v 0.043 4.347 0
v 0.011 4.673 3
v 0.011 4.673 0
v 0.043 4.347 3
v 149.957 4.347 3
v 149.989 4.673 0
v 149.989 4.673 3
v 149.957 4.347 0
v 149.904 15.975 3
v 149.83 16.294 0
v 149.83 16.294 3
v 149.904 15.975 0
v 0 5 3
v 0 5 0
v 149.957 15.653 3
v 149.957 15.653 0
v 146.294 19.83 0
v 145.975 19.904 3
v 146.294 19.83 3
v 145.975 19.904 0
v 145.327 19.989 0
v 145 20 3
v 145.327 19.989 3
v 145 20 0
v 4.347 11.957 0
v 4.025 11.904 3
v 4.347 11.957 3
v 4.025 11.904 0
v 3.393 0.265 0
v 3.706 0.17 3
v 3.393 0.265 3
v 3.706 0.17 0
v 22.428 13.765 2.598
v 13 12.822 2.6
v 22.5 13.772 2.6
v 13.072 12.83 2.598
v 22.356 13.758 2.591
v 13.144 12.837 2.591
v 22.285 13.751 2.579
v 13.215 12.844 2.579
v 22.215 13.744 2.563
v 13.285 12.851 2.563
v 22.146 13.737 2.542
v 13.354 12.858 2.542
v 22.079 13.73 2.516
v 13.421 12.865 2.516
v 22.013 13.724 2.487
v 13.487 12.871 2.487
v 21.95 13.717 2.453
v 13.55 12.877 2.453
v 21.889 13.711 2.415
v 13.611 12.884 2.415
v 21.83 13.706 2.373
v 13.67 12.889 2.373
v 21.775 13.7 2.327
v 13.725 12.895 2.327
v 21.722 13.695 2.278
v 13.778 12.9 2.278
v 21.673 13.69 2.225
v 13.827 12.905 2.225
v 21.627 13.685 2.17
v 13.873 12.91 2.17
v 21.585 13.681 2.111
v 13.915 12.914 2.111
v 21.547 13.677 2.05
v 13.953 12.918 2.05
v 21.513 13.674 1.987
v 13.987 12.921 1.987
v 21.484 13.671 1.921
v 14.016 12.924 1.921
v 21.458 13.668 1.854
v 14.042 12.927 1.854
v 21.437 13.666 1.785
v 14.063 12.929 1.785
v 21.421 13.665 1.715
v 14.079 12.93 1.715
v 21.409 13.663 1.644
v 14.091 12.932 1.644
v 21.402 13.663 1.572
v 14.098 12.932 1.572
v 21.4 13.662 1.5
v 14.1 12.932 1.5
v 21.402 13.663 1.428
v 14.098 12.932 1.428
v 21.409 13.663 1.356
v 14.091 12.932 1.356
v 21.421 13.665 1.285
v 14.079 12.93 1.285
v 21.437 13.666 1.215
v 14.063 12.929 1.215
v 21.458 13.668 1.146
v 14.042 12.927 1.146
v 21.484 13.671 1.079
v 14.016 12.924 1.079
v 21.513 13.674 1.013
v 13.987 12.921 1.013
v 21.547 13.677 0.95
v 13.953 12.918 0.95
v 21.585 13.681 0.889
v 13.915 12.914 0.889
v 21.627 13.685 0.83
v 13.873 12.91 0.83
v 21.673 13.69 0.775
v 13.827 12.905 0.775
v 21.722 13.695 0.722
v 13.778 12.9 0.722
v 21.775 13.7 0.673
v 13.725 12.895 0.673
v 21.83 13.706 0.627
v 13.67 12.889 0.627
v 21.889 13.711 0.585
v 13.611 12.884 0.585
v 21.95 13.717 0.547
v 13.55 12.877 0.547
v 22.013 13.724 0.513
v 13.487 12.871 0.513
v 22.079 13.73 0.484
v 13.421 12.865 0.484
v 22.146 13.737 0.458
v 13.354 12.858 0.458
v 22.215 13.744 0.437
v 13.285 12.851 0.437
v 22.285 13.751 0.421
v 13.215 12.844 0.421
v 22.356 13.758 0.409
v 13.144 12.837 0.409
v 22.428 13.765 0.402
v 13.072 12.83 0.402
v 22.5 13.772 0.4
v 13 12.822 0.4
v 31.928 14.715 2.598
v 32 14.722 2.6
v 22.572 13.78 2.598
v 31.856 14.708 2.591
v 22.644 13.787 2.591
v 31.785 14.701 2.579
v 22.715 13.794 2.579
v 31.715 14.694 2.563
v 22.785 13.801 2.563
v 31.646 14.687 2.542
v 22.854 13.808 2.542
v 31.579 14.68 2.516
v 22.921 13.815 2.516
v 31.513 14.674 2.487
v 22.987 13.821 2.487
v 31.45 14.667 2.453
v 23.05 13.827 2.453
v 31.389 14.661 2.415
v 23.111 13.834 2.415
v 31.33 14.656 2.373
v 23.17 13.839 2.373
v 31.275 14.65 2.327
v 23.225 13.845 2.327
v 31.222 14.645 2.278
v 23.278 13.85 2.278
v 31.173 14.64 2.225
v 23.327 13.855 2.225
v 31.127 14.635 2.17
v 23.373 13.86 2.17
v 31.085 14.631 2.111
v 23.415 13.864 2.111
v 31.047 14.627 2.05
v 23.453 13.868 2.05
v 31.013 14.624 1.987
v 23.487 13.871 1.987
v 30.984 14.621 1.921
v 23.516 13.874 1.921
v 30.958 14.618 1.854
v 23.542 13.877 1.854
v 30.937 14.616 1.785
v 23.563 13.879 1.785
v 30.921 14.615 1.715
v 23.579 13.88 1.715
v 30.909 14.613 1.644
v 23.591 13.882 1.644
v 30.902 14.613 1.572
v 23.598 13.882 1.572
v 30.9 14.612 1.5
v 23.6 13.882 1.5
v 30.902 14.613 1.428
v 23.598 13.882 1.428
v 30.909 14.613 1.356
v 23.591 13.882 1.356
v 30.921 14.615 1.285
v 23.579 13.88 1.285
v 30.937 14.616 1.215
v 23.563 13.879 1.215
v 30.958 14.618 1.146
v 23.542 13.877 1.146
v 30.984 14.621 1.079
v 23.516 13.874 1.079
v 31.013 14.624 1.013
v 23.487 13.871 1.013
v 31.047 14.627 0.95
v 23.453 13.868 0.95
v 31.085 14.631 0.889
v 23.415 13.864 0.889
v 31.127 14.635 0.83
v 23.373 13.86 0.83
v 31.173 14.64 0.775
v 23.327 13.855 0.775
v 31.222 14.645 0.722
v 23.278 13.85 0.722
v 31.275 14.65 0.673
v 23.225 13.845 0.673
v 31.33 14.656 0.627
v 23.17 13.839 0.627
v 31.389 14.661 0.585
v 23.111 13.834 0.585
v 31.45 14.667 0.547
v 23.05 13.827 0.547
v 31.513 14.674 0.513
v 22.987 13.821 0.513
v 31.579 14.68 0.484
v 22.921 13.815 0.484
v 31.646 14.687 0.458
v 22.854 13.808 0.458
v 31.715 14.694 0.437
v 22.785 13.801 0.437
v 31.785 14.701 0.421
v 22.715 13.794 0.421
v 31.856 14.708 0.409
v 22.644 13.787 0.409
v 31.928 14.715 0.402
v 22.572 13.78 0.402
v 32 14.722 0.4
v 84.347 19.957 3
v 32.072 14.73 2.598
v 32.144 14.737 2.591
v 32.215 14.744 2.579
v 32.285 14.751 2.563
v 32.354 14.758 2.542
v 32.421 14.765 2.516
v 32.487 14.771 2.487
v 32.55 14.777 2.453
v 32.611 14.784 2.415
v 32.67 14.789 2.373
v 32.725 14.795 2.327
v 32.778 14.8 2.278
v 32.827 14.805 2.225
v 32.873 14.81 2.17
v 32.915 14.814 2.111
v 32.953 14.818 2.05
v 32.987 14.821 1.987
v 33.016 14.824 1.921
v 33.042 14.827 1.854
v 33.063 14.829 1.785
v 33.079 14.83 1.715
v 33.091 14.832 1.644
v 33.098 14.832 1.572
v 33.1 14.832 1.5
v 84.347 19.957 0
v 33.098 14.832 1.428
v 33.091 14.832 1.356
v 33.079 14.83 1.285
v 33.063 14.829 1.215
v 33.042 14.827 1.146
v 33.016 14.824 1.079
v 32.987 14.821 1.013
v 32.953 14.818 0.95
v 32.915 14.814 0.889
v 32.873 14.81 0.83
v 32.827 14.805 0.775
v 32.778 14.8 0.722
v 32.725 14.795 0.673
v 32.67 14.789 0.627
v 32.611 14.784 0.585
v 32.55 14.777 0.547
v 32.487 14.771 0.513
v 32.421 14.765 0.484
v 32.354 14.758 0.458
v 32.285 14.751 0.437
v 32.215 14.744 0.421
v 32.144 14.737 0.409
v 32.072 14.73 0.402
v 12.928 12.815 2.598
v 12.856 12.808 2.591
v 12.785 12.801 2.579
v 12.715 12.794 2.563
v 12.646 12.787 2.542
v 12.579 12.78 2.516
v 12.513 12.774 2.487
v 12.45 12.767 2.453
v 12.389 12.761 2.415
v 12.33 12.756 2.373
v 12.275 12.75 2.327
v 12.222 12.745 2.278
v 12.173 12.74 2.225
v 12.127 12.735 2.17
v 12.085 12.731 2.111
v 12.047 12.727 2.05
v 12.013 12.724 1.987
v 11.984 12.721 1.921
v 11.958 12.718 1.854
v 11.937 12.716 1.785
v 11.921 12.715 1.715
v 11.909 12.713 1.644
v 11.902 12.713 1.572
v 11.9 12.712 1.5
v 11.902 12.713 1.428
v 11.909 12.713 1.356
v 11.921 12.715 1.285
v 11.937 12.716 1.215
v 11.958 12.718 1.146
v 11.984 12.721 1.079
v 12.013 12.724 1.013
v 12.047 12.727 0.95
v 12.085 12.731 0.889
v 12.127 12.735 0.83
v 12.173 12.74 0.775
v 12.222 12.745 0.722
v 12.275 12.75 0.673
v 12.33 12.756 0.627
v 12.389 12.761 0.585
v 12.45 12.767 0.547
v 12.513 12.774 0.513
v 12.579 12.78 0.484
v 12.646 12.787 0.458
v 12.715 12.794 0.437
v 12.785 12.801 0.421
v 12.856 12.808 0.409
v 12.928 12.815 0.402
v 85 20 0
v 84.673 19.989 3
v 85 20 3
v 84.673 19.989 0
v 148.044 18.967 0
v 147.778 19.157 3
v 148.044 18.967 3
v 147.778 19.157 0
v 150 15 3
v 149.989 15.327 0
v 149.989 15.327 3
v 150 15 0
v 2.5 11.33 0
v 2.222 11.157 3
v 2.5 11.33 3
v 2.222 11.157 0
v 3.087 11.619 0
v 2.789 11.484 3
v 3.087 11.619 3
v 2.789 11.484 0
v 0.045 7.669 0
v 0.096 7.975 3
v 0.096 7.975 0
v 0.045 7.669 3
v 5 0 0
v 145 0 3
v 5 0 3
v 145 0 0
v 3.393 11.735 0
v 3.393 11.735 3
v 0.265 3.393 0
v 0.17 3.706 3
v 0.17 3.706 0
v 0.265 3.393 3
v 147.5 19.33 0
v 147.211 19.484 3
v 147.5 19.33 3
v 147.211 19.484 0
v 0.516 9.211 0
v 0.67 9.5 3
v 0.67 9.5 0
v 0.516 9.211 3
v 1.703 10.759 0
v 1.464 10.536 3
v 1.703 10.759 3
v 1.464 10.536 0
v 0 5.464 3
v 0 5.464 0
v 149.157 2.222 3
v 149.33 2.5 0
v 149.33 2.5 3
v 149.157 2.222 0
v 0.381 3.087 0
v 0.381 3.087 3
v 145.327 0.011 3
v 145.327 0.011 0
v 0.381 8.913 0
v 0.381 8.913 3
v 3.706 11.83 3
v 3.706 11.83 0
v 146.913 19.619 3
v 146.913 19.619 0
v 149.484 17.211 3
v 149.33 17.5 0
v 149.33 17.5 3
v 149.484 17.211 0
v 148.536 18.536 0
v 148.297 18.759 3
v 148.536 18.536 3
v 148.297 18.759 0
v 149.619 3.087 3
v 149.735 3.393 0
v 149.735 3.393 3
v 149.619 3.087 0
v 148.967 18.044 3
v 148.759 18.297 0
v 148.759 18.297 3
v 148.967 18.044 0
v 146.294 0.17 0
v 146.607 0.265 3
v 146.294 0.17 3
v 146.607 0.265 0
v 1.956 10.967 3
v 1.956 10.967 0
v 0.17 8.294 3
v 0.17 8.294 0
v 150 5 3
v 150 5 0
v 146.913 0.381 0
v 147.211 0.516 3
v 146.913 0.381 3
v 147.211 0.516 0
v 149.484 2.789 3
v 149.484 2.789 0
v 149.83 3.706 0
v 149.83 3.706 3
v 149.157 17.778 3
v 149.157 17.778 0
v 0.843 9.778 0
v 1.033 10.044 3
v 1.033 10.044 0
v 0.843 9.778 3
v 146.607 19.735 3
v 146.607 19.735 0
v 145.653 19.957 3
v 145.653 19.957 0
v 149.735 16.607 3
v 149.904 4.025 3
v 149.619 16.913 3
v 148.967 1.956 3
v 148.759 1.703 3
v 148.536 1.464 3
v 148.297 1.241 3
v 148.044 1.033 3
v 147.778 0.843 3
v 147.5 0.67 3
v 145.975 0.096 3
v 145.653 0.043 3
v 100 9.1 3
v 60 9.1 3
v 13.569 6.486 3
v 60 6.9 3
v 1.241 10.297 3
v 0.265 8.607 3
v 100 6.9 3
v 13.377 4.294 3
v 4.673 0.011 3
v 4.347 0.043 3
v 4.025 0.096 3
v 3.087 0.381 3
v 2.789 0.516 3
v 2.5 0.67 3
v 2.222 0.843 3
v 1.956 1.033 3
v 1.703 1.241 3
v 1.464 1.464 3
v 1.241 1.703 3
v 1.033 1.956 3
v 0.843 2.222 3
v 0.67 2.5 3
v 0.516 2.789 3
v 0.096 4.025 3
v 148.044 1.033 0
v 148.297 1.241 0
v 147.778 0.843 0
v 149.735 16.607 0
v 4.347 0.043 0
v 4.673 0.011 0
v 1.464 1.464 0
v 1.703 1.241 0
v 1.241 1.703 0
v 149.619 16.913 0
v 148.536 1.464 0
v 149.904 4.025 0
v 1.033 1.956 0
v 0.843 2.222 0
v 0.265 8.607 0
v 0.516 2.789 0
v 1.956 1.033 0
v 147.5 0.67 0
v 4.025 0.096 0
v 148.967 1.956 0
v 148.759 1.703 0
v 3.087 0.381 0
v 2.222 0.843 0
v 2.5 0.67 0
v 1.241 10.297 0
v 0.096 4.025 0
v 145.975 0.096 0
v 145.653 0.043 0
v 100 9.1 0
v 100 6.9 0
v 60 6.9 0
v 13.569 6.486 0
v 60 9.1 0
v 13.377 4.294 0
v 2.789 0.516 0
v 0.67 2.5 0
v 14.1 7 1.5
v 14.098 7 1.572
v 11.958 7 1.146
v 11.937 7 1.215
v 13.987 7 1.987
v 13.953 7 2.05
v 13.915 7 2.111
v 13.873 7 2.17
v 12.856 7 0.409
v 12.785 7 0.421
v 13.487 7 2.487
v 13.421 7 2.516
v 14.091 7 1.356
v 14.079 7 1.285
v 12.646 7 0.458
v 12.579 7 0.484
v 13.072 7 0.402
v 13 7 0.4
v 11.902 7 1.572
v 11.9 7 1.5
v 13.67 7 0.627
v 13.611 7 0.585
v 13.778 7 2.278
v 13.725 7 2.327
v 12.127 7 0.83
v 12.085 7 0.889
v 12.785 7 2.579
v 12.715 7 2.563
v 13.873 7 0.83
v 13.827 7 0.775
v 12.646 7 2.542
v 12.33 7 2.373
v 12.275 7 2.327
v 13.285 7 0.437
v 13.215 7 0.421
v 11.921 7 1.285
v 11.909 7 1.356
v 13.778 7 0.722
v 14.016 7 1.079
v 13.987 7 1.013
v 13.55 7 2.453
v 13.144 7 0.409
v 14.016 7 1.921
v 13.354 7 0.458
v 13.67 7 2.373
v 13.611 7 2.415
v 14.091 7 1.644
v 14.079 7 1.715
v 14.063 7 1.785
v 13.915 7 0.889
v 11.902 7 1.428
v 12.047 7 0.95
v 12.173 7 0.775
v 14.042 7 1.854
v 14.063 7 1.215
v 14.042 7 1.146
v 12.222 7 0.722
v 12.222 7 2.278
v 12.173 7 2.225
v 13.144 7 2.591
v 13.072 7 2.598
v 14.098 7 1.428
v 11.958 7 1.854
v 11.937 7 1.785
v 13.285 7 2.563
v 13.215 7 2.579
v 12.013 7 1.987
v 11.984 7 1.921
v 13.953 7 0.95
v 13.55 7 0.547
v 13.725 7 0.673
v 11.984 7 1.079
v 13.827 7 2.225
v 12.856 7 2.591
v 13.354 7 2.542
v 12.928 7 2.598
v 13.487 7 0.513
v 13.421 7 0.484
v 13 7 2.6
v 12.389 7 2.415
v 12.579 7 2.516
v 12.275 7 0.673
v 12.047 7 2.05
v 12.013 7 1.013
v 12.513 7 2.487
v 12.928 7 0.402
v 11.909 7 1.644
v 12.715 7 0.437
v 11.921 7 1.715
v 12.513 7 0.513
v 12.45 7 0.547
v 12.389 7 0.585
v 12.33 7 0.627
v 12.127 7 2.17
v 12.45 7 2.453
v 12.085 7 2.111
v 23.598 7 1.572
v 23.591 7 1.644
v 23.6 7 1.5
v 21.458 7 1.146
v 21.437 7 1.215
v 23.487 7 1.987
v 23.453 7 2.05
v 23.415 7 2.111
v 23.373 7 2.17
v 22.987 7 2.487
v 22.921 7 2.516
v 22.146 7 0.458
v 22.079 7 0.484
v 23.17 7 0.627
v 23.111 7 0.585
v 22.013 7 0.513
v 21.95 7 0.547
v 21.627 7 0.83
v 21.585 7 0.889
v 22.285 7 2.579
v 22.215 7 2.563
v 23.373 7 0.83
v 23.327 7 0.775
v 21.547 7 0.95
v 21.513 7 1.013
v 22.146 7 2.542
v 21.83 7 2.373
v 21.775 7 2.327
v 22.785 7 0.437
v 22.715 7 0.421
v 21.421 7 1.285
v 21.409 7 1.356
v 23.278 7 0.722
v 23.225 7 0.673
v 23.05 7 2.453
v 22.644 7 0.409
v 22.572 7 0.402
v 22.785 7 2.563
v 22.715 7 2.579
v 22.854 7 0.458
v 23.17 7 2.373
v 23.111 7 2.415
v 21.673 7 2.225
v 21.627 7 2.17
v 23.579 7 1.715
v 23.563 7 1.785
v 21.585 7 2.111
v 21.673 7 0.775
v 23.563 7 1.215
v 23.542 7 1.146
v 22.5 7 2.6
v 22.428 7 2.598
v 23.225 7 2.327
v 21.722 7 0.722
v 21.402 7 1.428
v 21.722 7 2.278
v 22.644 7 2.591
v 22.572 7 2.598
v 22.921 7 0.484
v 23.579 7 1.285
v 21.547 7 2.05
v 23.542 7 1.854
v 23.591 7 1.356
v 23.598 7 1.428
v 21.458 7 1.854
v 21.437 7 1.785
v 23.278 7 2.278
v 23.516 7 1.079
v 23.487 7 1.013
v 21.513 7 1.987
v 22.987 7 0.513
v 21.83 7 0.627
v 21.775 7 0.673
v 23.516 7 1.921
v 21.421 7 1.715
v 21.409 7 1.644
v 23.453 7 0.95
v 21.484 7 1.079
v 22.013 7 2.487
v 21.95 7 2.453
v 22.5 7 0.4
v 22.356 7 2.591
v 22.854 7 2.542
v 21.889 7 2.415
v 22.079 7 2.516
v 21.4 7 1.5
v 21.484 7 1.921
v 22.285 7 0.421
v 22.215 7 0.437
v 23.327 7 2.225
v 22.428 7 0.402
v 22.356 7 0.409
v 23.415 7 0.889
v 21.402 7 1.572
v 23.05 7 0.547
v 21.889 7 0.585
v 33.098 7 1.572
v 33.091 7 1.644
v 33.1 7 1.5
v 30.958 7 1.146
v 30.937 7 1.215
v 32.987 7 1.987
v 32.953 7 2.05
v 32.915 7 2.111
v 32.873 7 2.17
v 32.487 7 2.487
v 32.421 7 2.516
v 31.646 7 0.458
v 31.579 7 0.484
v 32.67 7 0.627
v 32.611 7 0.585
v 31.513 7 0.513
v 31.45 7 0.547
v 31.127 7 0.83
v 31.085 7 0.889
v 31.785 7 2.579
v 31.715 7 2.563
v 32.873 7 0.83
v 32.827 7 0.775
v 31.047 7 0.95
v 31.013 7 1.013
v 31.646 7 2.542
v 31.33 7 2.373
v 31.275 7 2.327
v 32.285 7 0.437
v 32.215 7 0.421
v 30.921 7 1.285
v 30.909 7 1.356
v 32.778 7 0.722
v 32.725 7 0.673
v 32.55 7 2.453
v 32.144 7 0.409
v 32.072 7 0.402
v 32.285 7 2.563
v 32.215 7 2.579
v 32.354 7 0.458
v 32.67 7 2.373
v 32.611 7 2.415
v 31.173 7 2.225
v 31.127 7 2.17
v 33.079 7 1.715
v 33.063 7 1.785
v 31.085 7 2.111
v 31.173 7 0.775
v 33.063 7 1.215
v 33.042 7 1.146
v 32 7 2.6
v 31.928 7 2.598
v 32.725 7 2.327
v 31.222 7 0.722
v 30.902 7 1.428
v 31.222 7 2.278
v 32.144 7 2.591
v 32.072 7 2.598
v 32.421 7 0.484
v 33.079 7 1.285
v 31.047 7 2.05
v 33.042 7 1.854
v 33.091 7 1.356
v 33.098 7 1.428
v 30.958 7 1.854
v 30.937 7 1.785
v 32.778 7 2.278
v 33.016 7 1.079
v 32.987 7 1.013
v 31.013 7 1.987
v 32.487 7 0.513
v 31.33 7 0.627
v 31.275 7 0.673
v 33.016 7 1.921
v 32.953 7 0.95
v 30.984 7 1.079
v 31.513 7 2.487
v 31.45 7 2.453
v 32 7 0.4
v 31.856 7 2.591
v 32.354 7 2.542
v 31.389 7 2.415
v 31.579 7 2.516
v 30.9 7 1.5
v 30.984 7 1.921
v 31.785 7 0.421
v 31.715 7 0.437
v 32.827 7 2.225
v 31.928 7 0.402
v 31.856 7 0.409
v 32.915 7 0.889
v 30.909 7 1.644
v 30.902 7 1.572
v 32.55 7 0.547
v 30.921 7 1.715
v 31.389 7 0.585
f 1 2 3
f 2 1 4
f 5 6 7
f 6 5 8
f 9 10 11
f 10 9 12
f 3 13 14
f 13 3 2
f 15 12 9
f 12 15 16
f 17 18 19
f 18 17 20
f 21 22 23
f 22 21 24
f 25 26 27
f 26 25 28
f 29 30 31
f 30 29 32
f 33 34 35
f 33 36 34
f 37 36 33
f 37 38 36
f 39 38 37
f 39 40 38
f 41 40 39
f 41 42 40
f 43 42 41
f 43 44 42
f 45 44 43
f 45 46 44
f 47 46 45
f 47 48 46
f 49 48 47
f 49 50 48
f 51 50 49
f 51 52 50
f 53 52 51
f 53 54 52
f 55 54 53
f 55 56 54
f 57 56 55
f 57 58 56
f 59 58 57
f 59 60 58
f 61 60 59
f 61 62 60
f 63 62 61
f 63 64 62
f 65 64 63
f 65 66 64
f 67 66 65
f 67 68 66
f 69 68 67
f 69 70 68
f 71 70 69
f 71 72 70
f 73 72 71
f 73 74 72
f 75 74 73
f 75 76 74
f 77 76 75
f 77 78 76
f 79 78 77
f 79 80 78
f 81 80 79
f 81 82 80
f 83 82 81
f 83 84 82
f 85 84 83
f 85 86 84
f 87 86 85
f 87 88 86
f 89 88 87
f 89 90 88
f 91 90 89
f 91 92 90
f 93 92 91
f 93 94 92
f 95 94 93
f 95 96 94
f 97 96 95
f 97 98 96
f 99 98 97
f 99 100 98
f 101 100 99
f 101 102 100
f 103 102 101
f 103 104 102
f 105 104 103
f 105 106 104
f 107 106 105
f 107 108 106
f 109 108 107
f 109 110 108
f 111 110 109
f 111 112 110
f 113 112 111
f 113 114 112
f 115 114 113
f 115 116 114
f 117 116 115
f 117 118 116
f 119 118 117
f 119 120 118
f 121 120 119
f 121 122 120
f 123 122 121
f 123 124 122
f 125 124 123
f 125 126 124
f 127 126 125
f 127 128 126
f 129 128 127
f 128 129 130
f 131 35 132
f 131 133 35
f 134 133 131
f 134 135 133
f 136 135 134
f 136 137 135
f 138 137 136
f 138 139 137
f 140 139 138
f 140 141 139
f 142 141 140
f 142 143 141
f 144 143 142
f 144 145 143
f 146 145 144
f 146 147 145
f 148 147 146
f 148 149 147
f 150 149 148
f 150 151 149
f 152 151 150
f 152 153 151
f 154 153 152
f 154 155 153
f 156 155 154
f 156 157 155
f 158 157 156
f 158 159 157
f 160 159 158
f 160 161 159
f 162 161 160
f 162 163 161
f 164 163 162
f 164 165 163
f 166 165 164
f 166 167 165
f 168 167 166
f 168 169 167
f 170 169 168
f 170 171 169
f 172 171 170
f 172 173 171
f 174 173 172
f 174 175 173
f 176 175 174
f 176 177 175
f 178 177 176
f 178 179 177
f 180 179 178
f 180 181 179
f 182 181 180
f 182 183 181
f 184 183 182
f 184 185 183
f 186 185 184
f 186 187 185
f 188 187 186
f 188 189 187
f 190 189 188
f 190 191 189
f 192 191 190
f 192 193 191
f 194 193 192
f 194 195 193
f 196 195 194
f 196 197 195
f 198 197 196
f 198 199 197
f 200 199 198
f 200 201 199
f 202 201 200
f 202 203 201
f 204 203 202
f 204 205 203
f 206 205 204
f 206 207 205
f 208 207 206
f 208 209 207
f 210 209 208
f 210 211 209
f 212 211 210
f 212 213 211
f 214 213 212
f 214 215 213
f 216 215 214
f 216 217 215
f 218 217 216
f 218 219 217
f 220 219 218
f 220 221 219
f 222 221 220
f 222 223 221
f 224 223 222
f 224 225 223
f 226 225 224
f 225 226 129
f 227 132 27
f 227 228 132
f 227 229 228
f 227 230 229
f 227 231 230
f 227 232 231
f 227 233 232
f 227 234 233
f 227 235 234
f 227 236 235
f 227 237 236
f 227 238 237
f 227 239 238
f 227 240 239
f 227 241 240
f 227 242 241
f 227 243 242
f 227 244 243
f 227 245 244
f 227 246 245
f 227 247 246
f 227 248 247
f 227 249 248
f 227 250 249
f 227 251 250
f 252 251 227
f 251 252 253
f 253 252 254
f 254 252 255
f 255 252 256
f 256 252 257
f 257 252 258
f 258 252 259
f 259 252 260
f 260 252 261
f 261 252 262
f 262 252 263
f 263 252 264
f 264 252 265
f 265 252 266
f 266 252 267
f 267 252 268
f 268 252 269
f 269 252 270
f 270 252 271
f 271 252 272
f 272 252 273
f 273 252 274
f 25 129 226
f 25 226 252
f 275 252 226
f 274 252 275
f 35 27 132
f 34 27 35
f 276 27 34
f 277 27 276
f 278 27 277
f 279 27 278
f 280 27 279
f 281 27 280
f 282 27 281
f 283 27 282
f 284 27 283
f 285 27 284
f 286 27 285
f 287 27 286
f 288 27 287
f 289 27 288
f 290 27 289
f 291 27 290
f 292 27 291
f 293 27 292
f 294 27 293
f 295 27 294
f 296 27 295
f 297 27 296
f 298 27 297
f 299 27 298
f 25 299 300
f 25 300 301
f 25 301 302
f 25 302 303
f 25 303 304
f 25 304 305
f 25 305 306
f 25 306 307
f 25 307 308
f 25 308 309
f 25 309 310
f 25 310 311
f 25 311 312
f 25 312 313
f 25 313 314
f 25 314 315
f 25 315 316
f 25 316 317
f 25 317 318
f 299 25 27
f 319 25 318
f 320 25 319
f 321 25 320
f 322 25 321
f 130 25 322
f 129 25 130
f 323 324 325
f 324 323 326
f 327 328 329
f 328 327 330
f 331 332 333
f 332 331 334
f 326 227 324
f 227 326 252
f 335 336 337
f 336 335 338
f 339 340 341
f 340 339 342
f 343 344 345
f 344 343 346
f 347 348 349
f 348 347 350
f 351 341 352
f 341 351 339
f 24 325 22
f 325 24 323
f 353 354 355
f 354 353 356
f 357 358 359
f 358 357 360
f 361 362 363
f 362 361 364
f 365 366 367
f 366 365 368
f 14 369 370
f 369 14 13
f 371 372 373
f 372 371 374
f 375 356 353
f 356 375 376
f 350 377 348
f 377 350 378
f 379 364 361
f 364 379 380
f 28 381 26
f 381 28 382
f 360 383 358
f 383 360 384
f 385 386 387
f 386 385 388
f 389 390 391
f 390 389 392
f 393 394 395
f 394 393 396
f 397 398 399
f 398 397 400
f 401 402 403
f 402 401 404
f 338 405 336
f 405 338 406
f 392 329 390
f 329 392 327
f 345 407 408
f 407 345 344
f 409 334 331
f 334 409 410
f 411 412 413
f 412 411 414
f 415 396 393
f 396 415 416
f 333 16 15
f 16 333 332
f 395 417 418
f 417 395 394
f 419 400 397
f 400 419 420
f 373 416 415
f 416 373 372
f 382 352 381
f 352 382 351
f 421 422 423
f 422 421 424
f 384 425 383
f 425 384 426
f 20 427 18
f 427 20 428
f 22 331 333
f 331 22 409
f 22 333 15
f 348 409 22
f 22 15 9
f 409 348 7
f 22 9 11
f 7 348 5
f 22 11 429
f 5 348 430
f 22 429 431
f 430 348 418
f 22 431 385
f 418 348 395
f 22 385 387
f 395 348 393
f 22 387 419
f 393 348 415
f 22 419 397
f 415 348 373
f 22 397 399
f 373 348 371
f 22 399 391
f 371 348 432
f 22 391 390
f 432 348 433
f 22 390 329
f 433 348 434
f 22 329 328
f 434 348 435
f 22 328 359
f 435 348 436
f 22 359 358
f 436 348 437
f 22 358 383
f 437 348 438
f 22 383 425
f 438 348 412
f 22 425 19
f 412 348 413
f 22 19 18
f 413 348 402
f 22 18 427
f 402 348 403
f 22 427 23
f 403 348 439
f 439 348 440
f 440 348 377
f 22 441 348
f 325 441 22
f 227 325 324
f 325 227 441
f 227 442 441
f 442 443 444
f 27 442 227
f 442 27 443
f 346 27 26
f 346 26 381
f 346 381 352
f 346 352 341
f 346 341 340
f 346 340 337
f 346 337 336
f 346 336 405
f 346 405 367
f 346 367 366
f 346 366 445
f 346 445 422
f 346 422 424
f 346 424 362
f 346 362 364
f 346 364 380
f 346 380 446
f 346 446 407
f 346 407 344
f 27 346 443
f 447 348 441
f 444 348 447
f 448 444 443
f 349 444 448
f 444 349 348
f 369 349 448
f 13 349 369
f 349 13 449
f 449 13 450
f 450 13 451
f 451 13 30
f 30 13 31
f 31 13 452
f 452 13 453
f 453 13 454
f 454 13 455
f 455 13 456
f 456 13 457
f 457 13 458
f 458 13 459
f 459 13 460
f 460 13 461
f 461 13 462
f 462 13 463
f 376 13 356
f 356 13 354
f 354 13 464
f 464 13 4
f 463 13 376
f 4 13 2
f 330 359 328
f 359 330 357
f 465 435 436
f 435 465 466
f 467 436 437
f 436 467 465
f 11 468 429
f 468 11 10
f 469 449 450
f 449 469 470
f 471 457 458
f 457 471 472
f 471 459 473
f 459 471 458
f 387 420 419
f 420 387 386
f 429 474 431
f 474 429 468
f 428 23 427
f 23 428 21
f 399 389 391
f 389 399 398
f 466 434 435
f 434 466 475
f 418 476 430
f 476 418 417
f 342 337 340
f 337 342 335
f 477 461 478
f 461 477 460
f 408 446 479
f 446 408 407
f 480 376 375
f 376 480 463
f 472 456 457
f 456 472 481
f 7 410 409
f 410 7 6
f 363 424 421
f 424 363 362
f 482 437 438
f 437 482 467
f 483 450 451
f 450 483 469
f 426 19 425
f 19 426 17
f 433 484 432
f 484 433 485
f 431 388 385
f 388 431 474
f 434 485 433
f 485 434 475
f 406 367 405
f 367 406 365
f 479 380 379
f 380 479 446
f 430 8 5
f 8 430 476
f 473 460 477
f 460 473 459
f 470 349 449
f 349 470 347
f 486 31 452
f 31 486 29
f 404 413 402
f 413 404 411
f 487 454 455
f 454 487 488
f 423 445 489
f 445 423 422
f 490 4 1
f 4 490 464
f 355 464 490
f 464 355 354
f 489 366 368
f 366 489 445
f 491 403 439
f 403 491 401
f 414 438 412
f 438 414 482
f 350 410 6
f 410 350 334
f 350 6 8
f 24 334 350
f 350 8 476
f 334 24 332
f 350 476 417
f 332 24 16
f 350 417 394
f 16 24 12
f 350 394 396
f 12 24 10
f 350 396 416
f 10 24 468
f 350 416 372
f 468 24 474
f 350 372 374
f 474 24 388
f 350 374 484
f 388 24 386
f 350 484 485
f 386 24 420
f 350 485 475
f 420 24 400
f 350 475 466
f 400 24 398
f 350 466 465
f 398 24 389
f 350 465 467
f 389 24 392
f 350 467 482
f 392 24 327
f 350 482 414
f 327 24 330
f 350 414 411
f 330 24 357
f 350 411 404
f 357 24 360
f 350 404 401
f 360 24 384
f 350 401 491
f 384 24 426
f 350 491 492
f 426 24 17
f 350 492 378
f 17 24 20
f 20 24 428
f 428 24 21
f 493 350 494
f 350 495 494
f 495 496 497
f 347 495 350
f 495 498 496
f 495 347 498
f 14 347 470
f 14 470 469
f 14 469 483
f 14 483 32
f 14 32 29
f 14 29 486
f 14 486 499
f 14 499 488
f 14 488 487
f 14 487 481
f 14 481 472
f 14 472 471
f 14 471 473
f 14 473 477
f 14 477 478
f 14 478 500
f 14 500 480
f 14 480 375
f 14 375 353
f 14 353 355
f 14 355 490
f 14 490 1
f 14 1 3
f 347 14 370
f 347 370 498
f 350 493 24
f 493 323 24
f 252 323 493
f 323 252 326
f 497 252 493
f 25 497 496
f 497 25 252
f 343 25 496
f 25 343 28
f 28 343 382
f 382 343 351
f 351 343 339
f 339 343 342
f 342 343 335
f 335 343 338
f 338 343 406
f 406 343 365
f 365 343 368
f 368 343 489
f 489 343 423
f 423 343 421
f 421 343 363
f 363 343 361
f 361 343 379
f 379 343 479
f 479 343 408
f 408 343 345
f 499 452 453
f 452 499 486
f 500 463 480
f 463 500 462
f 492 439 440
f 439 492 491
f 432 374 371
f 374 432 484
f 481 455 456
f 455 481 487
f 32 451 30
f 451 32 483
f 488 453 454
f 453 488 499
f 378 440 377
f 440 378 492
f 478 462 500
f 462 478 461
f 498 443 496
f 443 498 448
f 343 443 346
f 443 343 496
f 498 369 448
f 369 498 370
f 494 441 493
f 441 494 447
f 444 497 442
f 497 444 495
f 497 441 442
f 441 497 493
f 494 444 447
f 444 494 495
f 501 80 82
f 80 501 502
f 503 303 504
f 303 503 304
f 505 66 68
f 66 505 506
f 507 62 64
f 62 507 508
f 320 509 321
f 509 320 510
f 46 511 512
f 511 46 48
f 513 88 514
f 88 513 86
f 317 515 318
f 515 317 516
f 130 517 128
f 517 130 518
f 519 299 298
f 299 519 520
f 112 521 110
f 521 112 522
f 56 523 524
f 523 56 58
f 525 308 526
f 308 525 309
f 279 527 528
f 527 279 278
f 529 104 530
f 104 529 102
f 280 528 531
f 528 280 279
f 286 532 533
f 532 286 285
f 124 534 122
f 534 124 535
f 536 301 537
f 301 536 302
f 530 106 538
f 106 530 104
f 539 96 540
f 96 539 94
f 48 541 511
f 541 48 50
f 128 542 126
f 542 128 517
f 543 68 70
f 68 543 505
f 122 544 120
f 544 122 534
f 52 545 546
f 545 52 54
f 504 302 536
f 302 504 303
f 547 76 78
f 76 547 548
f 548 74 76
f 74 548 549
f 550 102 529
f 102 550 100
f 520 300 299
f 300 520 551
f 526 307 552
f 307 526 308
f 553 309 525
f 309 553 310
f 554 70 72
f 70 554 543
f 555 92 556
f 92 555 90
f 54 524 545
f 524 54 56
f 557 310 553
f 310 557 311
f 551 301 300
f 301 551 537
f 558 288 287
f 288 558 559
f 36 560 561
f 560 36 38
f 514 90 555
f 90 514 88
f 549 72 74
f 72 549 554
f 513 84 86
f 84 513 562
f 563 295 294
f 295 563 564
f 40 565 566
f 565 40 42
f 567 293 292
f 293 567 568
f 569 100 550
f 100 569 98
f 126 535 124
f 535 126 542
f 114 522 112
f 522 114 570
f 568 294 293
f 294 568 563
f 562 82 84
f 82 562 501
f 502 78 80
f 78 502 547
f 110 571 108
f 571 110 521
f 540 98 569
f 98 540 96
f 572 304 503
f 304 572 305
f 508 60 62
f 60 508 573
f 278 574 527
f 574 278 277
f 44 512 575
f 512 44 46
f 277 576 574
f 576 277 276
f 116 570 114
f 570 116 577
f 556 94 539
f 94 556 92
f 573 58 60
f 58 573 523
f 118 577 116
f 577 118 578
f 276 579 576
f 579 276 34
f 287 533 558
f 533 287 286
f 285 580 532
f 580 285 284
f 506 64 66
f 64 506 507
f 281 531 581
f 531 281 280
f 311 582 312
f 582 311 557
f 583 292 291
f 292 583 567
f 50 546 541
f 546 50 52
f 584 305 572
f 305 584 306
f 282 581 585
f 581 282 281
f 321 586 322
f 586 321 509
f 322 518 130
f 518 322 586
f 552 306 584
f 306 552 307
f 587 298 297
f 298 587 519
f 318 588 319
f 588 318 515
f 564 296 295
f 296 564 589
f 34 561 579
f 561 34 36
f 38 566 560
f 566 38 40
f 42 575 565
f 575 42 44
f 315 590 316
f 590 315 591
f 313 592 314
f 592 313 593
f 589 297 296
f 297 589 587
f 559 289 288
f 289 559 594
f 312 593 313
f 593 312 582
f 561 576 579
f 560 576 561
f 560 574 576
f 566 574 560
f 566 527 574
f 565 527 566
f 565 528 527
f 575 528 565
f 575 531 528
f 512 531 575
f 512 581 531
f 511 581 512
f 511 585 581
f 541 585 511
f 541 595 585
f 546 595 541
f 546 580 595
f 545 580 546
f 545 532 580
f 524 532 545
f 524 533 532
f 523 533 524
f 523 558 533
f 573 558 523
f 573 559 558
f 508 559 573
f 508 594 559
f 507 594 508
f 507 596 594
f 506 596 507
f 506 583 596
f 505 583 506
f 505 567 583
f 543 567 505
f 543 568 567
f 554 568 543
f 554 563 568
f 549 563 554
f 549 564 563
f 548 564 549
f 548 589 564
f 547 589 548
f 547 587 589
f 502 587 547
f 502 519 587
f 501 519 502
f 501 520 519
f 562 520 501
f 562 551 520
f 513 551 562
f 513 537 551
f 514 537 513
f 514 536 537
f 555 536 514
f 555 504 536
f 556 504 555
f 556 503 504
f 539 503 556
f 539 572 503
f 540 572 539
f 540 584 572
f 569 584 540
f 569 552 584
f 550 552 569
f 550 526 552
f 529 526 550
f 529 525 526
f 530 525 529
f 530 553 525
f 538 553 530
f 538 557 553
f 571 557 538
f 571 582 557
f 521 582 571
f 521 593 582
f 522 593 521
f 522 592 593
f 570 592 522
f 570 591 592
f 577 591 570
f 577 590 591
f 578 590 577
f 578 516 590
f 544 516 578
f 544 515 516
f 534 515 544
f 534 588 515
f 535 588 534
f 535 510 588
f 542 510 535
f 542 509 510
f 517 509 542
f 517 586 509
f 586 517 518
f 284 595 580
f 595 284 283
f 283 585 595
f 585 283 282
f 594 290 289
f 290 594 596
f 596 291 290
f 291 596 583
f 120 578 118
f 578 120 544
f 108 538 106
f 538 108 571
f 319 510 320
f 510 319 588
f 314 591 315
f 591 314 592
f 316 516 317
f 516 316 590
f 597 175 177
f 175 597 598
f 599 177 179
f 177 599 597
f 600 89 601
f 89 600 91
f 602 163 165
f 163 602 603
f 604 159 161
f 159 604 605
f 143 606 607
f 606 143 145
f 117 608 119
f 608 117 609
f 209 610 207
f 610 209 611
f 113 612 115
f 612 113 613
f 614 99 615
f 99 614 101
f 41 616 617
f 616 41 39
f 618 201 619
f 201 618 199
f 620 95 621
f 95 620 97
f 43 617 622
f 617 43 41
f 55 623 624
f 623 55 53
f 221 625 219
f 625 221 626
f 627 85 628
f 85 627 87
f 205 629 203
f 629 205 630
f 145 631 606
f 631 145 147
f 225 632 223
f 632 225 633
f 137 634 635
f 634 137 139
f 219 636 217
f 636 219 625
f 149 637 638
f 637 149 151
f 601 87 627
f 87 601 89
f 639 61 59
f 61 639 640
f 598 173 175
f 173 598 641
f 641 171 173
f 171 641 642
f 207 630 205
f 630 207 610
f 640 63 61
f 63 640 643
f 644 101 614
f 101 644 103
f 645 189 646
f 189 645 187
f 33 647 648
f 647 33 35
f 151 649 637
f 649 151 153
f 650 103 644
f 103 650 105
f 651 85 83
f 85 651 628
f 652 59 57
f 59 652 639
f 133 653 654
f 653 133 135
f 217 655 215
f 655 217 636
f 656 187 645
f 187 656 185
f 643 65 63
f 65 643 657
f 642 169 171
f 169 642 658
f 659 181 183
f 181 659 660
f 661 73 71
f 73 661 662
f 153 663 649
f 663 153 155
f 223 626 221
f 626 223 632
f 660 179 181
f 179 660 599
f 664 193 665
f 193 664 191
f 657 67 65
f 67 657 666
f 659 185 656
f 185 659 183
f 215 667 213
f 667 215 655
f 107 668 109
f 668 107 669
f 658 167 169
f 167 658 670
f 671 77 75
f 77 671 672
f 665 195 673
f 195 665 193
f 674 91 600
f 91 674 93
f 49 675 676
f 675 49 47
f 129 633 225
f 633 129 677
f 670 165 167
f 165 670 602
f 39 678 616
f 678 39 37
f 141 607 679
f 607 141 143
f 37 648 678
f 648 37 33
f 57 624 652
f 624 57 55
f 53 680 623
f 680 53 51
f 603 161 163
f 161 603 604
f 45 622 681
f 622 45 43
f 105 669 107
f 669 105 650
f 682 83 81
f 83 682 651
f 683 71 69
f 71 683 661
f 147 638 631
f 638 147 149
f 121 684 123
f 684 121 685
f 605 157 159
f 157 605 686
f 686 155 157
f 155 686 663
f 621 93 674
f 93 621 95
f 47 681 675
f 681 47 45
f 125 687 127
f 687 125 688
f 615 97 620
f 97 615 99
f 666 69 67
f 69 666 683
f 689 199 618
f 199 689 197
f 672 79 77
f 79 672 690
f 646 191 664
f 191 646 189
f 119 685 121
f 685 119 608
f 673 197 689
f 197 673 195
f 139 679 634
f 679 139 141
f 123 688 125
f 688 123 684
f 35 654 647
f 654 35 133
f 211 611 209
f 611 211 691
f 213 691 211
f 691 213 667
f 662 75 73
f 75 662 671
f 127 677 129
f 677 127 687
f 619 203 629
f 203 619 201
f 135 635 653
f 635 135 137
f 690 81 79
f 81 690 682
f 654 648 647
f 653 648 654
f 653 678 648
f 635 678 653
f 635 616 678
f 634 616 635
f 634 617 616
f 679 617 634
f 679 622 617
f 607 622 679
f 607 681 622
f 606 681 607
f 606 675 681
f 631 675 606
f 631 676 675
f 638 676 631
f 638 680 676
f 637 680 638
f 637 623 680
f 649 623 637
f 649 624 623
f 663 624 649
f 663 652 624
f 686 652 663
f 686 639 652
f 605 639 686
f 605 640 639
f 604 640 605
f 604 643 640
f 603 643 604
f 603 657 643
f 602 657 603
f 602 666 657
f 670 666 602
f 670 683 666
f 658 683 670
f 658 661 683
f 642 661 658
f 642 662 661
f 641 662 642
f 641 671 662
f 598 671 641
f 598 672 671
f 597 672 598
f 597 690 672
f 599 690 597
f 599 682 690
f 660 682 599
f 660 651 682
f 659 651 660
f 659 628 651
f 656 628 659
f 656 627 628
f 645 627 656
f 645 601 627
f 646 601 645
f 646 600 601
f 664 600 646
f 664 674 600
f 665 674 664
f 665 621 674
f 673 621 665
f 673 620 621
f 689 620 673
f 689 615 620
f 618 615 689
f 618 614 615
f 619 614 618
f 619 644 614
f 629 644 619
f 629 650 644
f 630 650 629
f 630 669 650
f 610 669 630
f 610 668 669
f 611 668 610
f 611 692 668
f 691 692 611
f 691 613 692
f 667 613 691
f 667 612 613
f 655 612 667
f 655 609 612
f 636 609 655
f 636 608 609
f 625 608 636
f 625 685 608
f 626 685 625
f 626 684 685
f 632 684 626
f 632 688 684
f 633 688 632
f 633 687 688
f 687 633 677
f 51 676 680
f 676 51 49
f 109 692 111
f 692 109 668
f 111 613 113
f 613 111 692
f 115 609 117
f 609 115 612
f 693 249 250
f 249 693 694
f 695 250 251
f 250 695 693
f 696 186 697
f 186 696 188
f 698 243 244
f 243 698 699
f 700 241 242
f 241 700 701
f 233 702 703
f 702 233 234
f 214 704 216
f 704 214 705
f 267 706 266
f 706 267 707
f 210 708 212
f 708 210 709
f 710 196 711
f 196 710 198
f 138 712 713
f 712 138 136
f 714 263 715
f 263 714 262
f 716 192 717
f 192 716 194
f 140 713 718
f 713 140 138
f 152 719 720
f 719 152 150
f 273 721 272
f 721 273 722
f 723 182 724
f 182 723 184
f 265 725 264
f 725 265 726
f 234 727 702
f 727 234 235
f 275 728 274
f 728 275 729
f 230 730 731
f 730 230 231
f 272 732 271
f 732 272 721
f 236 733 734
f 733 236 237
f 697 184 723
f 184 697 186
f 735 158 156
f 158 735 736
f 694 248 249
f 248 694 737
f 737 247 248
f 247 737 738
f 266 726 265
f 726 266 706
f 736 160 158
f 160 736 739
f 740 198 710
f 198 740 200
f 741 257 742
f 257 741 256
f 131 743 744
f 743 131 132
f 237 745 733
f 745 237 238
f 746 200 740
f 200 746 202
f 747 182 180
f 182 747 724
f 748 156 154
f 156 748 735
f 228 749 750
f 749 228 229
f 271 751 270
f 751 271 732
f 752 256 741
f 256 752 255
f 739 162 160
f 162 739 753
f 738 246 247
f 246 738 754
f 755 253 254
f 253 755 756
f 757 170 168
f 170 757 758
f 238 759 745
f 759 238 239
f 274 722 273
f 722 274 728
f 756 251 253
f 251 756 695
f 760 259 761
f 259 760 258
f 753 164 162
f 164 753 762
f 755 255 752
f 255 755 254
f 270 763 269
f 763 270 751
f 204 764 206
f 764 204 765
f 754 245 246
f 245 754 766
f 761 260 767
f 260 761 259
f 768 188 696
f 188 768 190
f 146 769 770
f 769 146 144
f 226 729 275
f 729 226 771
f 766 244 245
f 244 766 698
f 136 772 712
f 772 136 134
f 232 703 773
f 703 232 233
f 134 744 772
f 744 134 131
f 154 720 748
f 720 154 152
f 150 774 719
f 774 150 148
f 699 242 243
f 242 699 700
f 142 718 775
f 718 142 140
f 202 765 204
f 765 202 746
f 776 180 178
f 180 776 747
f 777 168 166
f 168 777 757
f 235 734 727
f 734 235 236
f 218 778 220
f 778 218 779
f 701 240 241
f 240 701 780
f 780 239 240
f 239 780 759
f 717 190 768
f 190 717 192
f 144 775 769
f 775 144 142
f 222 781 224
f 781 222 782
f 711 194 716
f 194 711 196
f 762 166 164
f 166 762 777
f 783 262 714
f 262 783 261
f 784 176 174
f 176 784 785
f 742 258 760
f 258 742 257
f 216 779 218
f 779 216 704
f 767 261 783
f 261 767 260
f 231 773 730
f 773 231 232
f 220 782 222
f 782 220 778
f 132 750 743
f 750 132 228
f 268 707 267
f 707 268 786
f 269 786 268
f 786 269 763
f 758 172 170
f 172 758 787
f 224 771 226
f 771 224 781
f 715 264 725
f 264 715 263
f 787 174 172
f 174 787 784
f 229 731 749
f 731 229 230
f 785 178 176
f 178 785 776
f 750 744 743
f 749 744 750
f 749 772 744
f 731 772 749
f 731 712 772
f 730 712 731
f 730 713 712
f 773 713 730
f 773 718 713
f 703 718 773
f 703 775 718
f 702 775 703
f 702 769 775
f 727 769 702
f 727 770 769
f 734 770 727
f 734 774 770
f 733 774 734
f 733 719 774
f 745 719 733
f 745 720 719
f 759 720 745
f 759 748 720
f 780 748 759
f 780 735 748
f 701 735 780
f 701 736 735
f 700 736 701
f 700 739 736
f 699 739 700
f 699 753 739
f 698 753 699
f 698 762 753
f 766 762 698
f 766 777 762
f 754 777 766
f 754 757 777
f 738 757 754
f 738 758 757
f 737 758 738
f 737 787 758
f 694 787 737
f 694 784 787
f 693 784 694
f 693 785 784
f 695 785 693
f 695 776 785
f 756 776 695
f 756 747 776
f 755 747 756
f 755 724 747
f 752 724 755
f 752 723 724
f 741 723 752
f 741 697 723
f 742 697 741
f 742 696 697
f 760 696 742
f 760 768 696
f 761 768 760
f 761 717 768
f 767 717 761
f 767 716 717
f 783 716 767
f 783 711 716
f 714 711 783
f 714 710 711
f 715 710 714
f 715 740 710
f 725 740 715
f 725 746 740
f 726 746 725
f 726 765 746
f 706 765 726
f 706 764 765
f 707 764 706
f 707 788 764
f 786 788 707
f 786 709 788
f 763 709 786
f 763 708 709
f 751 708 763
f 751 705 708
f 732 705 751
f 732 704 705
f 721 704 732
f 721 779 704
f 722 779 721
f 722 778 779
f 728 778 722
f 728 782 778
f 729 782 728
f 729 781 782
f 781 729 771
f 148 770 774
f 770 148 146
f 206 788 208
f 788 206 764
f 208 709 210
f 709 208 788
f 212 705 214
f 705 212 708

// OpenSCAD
// Simple glider.

// Copyright (C) 2015 Embecosm Limited (www.embecosm.com)

// Contributor: Jeremy Bennett <jeremy.bennett@embecosm.com>

// This file is licensed under the Creative Commons Attribution-ShareAlike 3.0
// Unported License. To view a copy of this license, visit
// http://creativecommons.org/licenses/by-sa/3.0/ or send a letter to Creative
// Commons, PO Box 1866, Mountain View, CA 94042, USA.


// A very simple hand thrown glider for indoor use.

// This is the fuselage.  Print with very low fill density in something like
// HIPS for low weight.


// Useful constants
corner_r =   5;
max_x    = 150;
canopy_x =  85;
max_y    =  20;
min_y    =  12;
fuse_z   =   3;

// Smooth corners
$fn = 96;

// 2D outline, which we'll later extrude.
module fuse_2d () {
    hull () {
        translate (v = [corner_r, corner_r, 0])
            circle (r = corner_r);
        translate (v = [max_x - corner_r, corner_r, 0])
            circle (r = corner_r);
        translate (v = [max_x - corner_r, max_y - corner_r, 0])
            circle (r = corner_r);
        translate (v = [canopy_x, max_y - corner_r, 0])
            circle (r = corner_r);
        translate (v = [corner_r, min_y - corner_r, 0])
            circle (r = corner_r);
    }
}


// 3D fuselage block.  No cutouts yet.
module fuse_3d () {
    linear_extrude (height = fuse_z, slices = 1, convexity = 1)
        fuse_2d ();
}


// Cut out the necessary slots
module fuselage () {
    difference () {
        fuse_3d ();
        // Tailwing
        translate (v = [6.5, min_y / 2, 0])
            rotate (a = [0, 0, -5])
                cube (size = [14,2.2,50], center = true);
        // Main wing
        translate (v = [60 + 40 / 2, 8, 0])
            cube (size = [40, 2.2, 50], center = true);
        // Studs for rudder
        translate (v = [10 + 3, 10 / 2 + 12 - 5, fuse_z / 2])
            rotate (a = [90, 0, 0])
                cylinder (r = 1.1, h = 10, center = true);
        translate (v = [10 + 12.5, 10 / 2 + 12 - 5, fuse_z / 2])
            rotate (a = [90, 0, 0])
                cylinder (r = 1.1, h = 10, center = true);
        translate (v = [10 + 22, 10 / 2 + 12 - 5, fuse_z / 2])
            rotate (a = [90, 0, 0])
                cylinder (r = 1.1, h = 10, center = true);
    }
}

fuselage ();
